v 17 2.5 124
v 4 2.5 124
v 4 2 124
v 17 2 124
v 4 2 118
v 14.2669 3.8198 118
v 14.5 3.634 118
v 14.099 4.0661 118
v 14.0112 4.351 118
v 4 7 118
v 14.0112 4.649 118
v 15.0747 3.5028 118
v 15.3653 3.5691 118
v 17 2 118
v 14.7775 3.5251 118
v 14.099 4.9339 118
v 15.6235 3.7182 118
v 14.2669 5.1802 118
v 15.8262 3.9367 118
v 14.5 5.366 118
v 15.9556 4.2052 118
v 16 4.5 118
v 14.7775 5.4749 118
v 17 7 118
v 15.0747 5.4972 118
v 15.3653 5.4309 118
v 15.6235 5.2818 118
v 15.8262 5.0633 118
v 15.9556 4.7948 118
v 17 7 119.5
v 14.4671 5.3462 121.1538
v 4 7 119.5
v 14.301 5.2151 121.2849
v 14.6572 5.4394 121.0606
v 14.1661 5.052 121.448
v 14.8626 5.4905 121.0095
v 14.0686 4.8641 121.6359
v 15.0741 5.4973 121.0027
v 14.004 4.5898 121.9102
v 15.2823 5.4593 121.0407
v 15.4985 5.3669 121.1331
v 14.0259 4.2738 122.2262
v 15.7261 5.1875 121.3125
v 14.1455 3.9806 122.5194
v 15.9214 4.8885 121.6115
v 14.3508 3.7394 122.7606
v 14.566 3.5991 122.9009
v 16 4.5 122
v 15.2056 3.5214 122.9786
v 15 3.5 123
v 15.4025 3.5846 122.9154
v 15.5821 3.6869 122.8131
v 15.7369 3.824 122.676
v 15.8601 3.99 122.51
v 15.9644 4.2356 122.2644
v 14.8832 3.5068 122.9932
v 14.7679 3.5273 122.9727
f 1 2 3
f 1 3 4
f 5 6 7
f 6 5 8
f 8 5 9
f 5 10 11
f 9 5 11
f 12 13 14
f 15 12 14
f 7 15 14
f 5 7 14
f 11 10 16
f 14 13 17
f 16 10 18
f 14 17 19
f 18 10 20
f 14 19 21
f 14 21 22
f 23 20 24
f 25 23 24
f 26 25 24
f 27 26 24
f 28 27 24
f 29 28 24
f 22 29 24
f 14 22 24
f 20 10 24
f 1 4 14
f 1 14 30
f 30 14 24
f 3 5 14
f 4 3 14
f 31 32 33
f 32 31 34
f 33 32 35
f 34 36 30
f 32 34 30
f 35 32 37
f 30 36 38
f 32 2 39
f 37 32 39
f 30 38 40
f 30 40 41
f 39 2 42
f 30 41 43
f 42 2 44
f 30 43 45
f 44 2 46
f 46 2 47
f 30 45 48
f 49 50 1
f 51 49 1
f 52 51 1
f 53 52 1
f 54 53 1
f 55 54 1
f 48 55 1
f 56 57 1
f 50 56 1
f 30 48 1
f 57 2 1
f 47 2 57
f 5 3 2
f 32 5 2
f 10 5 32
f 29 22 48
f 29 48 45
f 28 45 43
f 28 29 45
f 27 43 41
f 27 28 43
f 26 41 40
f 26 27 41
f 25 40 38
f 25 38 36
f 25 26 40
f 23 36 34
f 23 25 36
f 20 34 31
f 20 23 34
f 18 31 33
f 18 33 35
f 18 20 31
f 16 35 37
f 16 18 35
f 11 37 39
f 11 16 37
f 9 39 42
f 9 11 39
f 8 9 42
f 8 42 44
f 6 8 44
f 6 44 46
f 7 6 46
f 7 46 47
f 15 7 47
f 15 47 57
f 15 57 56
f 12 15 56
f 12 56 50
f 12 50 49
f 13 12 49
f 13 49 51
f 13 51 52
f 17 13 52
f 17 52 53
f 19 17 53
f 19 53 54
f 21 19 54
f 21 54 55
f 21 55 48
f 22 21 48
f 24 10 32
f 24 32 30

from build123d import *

# Parameters (mm, degrees)
CYLINDER010_R     = 1
CYLINDER010_DEPTH = 10
BOX017_W          = 13
BOX017_H          = 5
BOX017_DEPTH      = 6
CHAMFER001_SIZE   = 4.5


with BuildPart() as cilindro010:
    # Cylinder010 → Cylinder010 (new body)
    with BuildSketch(Plane(origin=(15, 4.5, 113), x_dir=(1, 0, 0), z_dir=(0, 0, 1))):
        Circle(CYLINDER010_R)
    extrude(amount=CYLINDER010_DEPTH)


with BuildPart() as sim:
    # Box017 → Box017 (new body)
    with BuildSketch(Plane(origin=(4, 2, 118), x_dir=(1, 0, 0), z_dir=(0, 0, 1))):
        with Locations((6.5, 2.5)):
            Rectangle(BOX017_W, BOX017_H)
    extrude(amount=BOX017_DEPTH)

    # Chamfer001
    chamfer001_edges = [sim.edges().sort_by_distance(p)[0] for p in [
        (10.5, 7, 124),
    ]]
    chamfer(chamfer001_edges, length=CHAMFER001_SIZE)

    # Cut030: cut Cilindro010
    add(cilindro010.part, mode=Mode.SUBTRACT)


solid = sim.part
